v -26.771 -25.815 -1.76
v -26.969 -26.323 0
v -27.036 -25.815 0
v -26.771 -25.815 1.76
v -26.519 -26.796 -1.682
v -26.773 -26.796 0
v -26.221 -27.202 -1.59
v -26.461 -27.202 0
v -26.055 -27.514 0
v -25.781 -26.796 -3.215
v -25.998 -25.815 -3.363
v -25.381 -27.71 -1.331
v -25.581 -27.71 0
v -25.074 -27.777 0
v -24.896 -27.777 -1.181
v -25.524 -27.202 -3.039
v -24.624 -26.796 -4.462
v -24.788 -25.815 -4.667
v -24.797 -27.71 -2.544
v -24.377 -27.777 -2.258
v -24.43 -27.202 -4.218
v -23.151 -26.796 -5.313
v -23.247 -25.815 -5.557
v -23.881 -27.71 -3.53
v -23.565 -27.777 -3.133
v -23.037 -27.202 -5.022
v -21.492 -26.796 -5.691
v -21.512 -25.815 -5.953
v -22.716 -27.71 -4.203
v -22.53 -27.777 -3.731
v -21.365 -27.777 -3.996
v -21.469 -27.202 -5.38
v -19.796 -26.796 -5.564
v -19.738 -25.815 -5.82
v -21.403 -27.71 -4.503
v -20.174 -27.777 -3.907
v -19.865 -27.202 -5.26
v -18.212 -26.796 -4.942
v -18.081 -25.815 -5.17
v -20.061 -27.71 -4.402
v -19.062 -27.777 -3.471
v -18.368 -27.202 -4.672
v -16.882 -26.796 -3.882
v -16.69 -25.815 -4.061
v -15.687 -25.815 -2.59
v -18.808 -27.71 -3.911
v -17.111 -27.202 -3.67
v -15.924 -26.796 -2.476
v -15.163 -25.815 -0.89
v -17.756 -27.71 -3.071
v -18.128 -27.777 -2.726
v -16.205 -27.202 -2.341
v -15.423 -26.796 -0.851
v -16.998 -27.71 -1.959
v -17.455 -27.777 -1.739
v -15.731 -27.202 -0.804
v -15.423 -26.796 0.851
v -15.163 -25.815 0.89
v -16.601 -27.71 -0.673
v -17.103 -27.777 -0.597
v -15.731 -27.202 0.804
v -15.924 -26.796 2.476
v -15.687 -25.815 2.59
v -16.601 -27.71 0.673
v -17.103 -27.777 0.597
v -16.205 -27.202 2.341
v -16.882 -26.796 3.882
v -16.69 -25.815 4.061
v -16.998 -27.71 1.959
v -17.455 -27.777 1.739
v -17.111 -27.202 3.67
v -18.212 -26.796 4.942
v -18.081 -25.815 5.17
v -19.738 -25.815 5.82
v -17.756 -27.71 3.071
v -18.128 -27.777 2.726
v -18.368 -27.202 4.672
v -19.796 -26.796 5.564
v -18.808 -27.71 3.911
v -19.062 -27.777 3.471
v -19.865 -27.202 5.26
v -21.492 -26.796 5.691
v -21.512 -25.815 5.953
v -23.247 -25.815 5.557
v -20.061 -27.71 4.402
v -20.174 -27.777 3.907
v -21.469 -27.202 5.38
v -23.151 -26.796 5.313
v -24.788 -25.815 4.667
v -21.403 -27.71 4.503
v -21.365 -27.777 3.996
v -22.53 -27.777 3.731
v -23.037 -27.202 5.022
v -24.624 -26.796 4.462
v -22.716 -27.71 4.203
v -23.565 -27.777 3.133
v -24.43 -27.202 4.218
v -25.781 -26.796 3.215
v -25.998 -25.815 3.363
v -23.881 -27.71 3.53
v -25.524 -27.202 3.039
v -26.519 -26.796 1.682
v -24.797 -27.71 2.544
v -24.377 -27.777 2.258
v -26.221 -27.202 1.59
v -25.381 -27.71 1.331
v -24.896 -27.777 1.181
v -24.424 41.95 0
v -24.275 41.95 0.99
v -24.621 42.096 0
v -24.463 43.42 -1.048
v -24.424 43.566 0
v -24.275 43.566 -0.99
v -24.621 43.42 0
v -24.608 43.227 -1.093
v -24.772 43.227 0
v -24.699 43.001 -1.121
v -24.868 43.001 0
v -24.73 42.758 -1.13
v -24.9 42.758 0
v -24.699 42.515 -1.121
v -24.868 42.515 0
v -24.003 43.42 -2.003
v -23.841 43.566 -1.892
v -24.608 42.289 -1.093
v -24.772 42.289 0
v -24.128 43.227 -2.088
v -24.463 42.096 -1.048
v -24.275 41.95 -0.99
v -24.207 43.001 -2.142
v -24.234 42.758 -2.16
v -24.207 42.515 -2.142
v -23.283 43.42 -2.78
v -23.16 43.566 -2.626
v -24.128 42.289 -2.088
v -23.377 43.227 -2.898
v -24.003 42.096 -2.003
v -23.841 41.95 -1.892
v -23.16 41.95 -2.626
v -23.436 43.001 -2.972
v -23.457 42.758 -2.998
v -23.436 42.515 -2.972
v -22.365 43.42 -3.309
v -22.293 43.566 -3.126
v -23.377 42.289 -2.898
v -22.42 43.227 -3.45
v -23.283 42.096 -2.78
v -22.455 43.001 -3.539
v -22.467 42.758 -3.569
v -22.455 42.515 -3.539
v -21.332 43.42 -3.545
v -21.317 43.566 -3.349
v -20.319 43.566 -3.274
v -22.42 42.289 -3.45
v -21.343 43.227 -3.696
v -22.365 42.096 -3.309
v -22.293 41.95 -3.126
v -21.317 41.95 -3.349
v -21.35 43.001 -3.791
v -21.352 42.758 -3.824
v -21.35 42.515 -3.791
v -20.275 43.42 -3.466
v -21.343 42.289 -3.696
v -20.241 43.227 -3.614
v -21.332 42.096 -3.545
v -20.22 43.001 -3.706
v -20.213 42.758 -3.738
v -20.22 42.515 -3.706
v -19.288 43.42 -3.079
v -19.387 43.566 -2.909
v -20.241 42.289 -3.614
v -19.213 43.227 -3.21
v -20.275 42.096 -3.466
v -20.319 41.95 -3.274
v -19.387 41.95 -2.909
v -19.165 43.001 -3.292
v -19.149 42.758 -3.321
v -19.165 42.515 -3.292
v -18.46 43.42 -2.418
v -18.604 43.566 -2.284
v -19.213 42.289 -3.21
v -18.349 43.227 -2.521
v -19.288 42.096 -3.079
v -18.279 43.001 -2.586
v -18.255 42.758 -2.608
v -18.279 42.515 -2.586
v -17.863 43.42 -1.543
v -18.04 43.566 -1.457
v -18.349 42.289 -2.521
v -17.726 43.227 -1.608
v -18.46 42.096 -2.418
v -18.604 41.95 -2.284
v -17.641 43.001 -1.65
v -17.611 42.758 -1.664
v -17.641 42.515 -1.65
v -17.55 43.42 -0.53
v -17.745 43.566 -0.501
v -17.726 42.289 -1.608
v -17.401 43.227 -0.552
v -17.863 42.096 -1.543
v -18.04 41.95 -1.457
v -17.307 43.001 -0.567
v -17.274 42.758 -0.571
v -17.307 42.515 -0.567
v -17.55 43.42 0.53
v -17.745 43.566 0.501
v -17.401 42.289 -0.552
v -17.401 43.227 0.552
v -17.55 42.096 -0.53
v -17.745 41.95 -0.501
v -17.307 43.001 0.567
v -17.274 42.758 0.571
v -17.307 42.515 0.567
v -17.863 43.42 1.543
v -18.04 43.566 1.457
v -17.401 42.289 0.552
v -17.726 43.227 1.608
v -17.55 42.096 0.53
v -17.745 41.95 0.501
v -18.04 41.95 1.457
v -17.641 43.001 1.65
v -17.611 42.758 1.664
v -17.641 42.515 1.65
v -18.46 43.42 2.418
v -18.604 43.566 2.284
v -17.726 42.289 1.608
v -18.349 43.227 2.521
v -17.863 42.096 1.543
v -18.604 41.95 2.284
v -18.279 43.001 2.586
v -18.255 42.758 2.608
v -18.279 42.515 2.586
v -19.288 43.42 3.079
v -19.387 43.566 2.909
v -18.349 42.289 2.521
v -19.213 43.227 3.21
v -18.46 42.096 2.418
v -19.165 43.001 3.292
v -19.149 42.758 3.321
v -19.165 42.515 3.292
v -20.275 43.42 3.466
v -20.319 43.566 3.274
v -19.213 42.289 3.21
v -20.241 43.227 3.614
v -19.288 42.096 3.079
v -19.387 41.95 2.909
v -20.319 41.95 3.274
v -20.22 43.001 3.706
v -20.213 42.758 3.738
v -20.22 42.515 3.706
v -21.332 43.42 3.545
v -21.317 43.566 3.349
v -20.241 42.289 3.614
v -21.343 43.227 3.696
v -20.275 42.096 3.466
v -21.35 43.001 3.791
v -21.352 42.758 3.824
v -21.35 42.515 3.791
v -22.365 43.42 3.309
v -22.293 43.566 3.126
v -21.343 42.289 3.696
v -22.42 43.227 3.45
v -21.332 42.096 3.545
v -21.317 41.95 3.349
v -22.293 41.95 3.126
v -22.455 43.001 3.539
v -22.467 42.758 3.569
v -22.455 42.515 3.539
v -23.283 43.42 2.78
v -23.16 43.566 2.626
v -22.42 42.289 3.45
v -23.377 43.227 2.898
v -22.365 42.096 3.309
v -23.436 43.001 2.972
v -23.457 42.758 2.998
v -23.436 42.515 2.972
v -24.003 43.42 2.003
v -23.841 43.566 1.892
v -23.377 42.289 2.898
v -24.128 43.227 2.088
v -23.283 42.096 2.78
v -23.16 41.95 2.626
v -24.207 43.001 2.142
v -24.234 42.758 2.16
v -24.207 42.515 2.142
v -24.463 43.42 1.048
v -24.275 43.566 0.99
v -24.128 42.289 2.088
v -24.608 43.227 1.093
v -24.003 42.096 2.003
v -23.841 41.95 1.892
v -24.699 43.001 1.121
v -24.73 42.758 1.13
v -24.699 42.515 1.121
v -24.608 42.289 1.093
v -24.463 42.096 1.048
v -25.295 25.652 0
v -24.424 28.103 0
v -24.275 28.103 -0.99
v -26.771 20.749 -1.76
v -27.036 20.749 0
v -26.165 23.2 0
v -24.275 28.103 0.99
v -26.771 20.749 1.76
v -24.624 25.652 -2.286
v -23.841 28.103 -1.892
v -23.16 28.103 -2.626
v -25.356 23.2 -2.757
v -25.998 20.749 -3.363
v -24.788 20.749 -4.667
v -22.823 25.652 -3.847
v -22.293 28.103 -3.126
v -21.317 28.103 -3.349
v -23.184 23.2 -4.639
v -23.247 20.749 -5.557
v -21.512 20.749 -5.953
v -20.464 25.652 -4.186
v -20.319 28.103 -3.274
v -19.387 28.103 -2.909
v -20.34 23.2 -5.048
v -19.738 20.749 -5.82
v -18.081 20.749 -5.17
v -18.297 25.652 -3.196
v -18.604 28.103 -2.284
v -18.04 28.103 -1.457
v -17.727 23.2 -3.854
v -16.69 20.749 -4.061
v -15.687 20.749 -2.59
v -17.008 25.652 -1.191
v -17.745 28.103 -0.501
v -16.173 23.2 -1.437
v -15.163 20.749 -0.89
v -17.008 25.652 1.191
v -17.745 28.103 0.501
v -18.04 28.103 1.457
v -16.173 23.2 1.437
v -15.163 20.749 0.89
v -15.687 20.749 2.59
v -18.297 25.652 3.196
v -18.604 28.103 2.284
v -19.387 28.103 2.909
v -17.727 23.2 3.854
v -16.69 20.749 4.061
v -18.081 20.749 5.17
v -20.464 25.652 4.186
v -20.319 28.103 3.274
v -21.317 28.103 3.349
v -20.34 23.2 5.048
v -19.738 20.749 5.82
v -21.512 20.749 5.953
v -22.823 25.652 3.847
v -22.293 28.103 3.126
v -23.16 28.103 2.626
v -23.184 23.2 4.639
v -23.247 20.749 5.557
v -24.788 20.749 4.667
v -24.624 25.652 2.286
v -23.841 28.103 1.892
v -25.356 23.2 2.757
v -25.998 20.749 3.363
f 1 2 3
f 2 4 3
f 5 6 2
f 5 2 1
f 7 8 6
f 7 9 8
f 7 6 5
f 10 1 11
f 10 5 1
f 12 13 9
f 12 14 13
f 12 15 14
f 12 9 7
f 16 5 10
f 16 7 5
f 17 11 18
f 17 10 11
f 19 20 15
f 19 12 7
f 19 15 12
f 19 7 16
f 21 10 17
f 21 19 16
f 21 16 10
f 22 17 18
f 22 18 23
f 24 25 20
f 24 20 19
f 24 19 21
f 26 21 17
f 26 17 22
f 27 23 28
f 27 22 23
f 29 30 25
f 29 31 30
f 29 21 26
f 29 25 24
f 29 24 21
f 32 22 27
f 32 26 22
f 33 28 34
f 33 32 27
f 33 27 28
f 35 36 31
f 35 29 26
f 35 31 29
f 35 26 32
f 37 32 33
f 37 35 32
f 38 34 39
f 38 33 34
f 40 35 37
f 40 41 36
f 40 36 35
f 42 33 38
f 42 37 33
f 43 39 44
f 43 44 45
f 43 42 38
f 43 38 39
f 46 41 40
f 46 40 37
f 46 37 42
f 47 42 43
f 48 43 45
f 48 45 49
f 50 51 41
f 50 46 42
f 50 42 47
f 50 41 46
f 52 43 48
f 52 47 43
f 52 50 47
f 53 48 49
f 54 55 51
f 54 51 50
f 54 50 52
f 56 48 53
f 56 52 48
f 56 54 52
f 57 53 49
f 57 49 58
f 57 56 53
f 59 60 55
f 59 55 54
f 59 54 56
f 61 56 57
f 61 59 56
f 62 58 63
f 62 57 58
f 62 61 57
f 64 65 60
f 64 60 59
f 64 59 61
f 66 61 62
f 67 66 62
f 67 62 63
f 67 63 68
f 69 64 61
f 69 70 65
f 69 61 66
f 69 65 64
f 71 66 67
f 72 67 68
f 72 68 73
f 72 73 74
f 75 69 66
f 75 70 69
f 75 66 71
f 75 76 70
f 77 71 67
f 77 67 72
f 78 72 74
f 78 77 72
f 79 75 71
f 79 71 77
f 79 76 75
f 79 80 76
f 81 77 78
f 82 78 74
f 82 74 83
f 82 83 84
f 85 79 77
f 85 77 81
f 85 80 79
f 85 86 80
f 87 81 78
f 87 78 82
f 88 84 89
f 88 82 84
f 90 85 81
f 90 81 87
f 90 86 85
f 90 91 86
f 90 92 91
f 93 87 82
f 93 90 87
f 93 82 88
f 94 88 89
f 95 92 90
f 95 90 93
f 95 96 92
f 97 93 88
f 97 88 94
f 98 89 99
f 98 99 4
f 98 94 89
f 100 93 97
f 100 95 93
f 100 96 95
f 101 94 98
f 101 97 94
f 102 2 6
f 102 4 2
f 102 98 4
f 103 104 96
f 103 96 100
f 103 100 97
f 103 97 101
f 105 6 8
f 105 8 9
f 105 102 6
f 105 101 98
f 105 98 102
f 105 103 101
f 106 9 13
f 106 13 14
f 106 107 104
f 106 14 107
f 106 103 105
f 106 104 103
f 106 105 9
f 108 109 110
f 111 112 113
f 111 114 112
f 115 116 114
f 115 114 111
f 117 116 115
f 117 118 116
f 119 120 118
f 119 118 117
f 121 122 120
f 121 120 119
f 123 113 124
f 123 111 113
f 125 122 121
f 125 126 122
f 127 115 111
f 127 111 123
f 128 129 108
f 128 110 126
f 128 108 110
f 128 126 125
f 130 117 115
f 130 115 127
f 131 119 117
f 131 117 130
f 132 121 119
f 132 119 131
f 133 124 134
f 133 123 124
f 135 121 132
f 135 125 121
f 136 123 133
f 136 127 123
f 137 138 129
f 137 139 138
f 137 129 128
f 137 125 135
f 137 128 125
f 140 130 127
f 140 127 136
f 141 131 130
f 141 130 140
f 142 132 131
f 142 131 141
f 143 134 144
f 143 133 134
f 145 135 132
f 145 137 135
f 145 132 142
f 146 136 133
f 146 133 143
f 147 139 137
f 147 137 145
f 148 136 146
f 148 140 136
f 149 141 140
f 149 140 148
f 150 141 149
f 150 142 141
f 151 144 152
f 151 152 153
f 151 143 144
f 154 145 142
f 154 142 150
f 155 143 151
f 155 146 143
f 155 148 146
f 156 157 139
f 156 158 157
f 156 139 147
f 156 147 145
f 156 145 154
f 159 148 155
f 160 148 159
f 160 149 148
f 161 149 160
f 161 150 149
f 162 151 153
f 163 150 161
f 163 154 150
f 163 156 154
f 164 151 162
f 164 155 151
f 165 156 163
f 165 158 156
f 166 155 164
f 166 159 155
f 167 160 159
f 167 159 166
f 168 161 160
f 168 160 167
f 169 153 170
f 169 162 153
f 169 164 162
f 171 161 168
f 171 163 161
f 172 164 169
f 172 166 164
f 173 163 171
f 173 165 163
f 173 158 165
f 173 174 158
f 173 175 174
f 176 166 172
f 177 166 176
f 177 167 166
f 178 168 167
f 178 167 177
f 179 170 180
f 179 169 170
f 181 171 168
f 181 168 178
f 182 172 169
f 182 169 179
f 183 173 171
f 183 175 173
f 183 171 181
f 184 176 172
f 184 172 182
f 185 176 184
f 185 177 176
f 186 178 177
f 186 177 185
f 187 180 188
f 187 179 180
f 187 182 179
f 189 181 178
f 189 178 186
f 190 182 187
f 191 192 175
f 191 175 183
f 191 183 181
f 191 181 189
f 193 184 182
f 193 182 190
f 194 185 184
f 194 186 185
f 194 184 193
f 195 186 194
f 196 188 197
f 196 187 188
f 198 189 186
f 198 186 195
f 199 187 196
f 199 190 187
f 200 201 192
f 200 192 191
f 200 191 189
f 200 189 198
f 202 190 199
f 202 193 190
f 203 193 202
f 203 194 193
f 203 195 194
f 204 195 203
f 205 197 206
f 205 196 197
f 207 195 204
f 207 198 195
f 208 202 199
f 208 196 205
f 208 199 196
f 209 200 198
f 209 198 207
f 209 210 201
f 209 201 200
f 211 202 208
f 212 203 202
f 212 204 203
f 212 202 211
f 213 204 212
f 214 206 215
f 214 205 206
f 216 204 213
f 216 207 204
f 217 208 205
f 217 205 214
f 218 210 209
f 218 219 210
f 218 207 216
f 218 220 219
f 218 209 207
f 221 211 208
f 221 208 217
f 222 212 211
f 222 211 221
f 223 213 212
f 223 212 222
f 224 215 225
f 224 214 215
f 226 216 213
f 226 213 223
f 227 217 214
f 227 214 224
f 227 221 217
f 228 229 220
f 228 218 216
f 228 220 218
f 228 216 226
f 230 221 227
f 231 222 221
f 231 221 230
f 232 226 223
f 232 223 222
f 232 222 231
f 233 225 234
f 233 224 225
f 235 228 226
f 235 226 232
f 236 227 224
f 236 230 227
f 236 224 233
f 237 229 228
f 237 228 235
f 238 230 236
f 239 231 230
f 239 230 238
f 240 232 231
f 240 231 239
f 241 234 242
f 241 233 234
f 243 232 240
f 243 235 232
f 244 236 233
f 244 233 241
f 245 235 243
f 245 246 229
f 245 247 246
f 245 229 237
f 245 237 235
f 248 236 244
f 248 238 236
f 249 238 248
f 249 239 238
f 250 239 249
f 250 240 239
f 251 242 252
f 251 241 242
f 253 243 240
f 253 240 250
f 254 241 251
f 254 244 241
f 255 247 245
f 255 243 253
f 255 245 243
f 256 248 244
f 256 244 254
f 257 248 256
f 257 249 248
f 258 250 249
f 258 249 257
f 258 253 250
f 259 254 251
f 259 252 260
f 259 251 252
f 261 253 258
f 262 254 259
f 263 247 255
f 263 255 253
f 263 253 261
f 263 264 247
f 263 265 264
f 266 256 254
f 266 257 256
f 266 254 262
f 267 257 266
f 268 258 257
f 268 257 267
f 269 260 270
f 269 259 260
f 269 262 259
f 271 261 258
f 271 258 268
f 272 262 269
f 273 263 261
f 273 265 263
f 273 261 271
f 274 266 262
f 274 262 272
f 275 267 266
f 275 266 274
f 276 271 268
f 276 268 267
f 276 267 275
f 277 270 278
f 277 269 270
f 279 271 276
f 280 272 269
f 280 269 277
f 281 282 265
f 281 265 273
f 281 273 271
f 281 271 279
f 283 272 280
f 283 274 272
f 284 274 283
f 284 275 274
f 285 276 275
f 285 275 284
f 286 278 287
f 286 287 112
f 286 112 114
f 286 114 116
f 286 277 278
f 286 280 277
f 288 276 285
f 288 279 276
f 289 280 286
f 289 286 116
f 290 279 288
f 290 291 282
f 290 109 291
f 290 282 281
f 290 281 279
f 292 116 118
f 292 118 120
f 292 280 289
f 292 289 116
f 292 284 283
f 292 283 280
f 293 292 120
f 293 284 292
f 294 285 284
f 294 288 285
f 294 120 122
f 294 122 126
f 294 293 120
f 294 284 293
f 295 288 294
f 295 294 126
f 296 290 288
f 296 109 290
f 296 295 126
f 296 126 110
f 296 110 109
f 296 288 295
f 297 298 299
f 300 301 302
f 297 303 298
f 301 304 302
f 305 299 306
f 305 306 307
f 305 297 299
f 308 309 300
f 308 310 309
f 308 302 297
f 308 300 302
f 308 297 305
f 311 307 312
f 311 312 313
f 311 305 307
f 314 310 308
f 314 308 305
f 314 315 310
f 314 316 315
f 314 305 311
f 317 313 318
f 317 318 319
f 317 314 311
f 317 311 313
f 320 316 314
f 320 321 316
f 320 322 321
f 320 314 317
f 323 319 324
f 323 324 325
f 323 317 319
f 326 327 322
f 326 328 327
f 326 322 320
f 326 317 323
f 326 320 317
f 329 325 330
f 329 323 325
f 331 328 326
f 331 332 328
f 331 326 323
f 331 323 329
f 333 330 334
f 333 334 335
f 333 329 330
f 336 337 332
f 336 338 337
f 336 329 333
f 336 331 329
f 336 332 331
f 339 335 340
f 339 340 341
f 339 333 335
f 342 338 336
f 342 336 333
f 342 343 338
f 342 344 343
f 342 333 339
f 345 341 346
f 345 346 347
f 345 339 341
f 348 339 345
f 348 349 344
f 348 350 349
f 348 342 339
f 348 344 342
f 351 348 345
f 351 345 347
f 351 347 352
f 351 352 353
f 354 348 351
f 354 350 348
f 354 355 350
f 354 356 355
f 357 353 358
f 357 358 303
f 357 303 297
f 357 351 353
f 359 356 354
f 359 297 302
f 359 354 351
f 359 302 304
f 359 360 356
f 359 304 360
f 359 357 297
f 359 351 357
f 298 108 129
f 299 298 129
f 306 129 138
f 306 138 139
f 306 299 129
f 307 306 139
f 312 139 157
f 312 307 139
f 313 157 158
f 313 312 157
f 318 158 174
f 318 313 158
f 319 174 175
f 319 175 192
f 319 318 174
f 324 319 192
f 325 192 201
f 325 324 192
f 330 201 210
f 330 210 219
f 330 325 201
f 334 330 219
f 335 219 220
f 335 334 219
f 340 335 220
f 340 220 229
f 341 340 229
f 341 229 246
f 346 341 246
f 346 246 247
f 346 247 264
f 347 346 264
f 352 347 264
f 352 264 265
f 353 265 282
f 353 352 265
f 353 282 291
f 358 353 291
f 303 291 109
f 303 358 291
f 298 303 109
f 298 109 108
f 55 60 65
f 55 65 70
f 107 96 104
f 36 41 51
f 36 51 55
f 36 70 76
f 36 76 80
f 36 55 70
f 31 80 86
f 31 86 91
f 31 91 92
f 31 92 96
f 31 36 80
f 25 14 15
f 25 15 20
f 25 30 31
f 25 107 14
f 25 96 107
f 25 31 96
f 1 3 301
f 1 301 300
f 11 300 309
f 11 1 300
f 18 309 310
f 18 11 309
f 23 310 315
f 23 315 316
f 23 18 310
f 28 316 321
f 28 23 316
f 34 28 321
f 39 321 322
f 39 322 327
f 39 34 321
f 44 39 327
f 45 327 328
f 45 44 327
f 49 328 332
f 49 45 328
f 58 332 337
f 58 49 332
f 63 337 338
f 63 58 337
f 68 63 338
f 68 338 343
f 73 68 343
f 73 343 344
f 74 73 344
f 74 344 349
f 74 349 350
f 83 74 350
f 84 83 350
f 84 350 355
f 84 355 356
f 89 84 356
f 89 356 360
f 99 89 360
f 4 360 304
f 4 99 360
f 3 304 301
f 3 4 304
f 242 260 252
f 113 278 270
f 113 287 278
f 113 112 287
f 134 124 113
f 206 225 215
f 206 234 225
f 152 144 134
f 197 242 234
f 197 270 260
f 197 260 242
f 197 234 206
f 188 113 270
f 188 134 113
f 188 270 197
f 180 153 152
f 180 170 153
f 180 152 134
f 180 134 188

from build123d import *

# Parameters (mm, degrees)
F2_R = 1.9622727835


with BuildPart() as f1:
    # F0 (on Top) → F1 (revolve)
    with BuildSketch(Plane.XY):
        Polygon((-21.0659306824, -27.7770664543), (-21.0659306824, 15.4031372249), (-21.0659306824, 28.1031372249), (-24.4244831643, 28.1031372249), (-27.0358305424, 20.7487531006), (-27.0358305424, -27.7770664543), align=None)
        Polygon((-24.4244831643, 28.1031372249), (-21.0659306824, 28.1031372249), (-21.0659306824, 43.5661226511), (-24.4244831643, 43.5661226511), (-24.4244831643, 41.9496893883), align=None)
        with BuildLine():
            ThreePointArc((-24.4244831643, 43.5661226511), (-24.9002133782, 42.7579060197), (-24.4244831643, 41.9496893883))
            Line((-24.4244831643, 41.9496893883), (-24.4244831643, 43.5661226511))
        make_face()
    revolve(axis=Axis((-21.0659306824, -6.1869646147, 0), (0, -1, 0)))

    # F2
    f2_edges = [f1.edges().sort_by_distance(p)[0] for p in [
        (-15.096031, -27.777066, 0),
    ]]
    fillet(f2_edges, radius=F2_R)


solid = f1.part
